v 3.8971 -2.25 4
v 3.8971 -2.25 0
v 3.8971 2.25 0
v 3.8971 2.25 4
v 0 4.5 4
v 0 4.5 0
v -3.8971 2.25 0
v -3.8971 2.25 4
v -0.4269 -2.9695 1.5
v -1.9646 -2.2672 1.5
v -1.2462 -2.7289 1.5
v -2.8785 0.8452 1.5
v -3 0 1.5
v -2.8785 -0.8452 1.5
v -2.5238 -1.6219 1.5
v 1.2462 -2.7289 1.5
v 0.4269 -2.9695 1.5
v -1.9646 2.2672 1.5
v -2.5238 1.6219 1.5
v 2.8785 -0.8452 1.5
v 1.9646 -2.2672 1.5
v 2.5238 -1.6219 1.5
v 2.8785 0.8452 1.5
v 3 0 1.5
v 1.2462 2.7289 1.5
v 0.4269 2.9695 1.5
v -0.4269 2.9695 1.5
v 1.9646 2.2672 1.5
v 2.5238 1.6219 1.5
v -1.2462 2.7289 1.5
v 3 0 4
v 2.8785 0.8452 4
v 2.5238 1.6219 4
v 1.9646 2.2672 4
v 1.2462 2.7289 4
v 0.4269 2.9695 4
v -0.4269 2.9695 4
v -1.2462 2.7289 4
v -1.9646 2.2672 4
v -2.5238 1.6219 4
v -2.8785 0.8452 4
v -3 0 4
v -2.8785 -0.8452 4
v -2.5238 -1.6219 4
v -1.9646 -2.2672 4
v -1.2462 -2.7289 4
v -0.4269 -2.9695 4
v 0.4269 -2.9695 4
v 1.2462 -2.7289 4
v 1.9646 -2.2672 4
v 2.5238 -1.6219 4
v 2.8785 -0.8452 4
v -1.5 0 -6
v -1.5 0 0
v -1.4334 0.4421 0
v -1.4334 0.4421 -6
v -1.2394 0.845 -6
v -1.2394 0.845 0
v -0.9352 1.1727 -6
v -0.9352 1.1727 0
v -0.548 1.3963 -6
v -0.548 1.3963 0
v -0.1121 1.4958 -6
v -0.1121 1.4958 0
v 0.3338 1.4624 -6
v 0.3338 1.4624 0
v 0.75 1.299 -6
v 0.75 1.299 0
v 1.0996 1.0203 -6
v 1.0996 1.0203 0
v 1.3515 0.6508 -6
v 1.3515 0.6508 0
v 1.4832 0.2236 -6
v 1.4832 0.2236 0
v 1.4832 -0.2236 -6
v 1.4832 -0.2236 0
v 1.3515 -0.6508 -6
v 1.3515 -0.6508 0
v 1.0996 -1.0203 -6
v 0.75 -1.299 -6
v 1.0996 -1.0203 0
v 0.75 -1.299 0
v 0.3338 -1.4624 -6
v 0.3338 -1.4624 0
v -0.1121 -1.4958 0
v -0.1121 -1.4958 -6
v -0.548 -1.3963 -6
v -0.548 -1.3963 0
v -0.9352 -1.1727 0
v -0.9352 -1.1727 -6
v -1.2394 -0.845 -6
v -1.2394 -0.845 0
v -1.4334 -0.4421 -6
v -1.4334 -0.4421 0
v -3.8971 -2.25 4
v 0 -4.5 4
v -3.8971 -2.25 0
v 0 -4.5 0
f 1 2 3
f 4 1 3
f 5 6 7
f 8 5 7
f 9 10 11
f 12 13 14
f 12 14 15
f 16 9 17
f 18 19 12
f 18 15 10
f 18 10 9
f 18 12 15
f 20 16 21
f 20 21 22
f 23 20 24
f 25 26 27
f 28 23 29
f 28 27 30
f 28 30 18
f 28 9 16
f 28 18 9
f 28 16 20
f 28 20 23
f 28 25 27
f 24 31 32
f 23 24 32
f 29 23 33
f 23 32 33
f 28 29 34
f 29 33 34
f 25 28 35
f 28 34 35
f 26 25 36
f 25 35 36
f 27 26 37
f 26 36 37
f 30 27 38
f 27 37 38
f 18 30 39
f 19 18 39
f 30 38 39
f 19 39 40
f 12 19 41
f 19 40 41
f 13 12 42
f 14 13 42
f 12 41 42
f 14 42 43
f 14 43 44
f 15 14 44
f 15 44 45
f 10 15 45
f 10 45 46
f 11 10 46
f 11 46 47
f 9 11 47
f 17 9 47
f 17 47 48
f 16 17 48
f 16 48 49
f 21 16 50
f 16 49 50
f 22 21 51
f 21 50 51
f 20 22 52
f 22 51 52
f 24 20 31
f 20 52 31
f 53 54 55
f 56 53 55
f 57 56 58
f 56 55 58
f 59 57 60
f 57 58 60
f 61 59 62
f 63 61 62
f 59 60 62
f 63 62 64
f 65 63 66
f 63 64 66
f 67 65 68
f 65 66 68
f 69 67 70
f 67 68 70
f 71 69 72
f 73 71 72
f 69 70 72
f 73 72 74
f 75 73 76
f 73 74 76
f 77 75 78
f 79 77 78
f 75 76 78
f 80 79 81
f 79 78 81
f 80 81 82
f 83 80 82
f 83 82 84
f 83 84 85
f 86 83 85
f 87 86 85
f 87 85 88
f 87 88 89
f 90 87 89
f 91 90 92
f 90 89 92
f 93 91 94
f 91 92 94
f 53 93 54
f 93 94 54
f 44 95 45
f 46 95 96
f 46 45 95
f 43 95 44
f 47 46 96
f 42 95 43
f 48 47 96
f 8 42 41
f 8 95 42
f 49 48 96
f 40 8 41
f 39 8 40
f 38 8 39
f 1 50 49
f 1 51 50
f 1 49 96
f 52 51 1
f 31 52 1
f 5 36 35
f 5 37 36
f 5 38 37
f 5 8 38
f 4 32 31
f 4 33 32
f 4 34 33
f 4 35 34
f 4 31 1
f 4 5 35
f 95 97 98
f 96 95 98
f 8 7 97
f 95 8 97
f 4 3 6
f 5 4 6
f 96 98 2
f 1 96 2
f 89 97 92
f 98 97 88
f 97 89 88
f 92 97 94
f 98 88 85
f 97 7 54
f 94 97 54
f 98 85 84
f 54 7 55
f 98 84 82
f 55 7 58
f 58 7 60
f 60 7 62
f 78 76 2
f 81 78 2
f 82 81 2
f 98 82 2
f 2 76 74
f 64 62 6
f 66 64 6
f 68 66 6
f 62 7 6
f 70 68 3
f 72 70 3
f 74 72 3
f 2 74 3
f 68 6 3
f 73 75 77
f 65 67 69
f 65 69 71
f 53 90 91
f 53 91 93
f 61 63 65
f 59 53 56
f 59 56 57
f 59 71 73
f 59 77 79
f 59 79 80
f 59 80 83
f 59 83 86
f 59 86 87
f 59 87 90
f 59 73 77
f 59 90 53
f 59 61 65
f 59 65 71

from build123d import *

# Parameters (mm, degrees)
EXTRUDE_1_DEPTH     = 4
SKETCH_3_R          = 1.5
EXTRUDE_2_DEPTH     = 6
SKETCH_4_R          = 3
CUT_EXTRUDE_1_DEPTH = 2.5


with BuildPart() as part:
    # ｽｹｯﾁ2 → ﾎﾞｽ - 押し出し1 (new body)
    with BuildSketch(Plane.XY):
        Polygon((3.897114317, -2.25), (3.897114317, 2.25), (0, 4.5), (-3.897114317, 2.25), (-3.897114317, -2.25), (0, -4.5), align=None)
    extrude(amount=EXTRUDE_1_DEPTH)

    # ｽｹｯﾁ3 → ﾎﾞｽ - 押し出し2 (add)
    with BuildSketch(Plane(origin=(0, 0, 0), x_dir=(-1, 0, 0), z_dir=(0, 0, -1))):
        Circle(SKETCH_3_R)
    extrude(amount=EXTRUDE_2_DEPTH)

    # ｽｹｯﾁ4 → ｶｯﾄ - 押し出し1 (cut)
    with BuildSketch(Plane.XY.offset(4)):
        Circle(SKETCH_4_R)
    extrude(amount=-CUT_EXTRUDE_1_DEPTH, mode=Mode.SUBTRACT)


solid = part.part
